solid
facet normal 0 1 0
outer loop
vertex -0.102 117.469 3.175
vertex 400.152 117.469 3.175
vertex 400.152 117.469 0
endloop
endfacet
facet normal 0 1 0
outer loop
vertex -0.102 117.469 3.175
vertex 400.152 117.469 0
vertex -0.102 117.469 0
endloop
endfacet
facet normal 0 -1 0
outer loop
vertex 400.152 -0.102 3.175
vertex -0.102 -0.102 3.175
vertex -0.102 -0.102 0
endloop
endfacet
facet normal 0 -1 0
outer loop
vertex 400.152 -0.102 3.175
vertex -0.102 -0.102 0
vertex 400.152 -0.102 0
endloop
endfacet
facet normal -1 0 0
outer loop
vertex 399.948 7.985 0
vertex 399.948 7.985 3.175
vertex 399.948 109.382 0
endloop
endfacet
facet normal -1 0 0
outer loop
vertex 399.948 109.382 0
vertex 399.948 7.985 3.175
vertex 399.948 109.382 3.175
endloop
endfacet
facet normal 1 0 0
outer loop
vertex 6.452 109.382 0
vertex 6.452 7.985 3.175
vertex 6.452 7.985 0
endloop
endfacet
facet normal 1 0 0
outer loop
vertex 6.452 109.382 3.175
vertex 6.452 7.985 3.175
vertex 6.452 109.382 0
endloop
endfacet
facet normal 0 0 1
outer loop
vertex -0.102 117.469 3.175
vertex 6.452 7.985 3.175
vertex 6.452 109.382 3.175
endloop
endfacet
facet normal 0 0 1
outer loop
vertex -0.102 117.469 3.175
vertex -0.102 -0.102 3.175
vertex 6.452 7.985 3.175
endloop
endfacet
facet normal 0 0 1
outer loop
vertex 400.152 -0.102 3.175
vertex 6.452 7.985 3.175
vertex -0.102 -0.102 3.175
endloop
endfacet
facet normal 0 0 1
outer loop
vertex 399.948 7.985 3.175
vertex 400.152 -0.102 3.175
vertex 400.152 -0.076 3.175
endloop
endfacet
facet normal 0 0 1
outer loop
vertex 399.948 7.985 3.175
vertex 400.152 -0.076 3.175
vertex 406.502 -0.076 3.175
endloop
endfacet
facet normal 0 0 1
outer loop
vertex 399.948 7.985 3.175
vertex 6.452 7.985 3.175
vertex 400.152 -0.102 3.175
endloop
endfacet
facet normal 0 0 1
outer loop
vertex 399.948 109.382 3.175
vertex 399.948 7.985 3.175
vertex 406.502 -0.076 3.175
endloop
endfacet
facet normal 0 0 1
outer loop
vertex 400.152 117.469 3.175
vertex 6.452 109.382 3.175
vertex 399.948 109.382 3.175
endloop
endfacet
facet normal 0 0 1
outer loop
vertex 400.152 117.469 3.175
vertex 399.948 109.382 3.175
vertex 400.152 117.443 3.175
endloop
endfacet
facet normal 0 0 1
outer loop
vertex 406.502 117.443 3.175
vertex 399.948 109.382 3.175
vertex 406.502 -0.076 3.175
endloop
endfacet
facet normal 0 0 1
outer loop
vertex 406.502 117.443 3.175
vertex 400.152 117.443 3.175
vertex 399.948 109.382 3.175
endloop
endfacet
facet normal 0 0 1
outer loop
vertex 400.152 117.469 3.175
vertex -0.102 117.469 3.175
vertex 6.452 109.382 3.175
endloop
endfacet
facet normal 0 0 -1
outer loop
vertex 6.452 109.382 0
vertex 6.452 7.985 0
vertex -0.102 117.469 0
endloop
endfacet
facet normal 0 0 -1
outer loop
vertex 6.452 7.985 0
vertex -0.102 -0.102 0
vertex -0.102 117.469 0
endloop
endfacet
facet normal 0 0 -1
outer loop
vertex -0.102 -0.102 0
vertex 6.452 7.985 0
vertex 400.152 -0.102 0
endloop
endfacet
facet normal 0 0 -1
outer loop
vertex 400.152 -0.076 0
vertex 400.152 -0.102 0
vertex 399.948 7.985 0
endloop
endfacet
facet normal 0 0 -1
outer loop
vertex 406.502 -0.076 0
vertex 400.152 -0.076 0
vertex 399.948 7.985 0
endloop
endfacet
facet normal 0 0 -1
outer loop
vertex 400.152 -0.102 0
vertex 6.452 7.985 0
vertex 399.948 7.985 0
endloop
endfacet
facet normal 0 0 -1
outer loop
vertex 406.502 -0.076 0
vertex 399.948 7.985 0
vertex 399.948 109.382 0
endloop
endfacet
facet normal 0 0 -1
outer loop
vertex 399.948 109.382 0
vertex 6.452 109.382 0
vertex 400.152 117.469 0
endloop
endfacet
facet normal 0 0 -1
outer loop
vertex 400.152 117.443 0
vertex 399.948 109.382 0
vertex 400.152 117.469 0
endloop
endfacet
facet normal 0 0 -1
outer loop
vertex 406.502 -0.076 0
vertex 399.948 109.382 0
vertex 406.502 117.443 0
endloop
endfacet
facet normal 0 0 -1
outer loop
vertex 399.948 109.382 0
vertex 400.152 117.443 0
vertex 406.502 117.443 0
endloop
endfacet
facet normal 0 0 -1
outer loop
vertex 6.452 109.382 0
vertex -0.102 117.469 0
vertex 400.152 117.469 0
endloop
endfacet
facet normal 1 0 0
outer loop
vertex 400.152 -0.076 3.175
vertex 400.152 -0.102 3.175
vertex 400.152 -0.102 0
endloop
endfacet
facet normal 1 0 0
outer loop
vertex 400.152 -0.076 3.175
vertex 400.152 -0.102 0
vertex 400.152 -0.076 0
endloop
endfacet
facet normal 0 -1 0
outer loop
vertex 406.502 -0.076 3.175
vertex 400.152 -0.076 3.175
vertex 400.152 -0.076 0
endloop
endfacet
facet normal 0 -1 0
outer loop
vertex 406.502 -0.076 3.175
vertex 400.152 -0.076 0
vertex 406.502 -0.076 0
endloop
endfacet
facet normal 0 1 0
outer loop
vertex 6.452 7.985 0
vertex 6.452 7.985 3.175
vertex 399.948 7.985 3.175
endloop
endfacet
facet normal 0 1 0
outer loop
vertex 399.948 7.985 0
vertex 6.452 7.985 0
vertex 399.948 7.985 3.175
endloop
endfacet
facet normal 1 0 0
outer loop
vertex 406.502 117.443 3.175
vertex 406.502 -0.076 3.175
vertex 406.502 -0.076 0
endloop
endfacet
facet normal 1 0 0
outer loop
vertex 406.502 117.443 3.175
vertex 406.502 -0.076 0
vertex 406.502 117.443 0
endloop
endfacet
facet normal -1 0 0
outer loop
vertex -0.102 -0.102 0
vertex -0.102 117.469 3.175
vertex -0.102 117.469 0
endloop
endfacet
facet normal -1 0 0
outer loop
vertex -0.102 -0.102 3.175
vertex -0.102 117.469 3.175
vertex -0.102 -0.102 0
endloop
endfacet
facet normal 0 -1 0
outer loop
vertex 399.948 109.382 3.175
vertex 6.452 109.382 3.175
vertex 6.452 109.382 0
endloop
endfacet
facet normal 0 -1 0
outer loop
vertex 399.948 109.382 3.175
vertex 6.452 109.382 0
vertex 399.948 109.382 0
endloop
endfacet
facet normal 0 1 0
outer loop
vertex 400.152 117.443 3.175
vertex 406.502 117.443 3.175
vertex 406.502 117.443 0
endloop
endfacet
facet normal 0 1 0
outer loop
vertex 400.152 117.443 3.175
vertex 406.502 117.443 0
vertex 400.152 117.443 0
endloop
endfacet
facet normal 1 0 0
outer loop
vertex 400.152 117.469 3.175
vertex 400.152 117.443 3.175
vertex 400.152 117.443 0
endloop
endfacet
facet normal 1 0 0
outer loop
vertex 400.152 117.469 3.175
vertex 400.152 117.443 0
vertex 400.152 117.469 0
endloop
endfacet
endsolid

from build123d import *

# Parameters (mm, degrees)
SKETCH1_W           = 393.7
SKETCH1_H           = 101.6
BOSS_EXTRUDE1_DEPTH = 3.175
SKETCH2_W           = 393.4968
SKETCH2_H           = 101.3968
BOSS_EXTRUDE2_DEPTH = 3.175


with BuildPart() as part:
    # Sketch1 → Boss-Extrude1 (new body)
    with BuildSketch(Plane.XY):
        Polygon((0, 0), (400.05, 0), (400.05, 0.0254), (406.4, 0.0254), (406.4, 0), (406.4, 117.36705), (406.4, 117.34165), (400.05, 117.34165), (400.05, 117.36705), (0, 117.36705), align=None)
        with Locations((203.2, 58.683525)):
            Rectangle(SKETCH1_W, SKETCH1_H, mode=Mode.SUBTRACT)
    extrude(amount=BOSS_EXTRUDE1_DEPTH)

    # Sketch2 → Boss-Extrude2 (add)
    with BuildSketch(Plane.XY.offset(3.175)):
        Polygon((400.1516, 117.46865), (-0.1016, 117.46865), (-0.1016, -0.1016), (400.1516, -0.1016), (400.1516, -0.0762), (406.5016, -0.0762), (406.5016, 117.44325), (400.1516, 117.44325), align=None)
        with Locations((203.2, 58.683525)):
            Rectangle(SKETCH2_W, SKETCH2_H, mode=Mode.SUBTRACT)
    extrude(amount=-BOSS_EXTRUDE2_DEPTH)


solid = part.part
